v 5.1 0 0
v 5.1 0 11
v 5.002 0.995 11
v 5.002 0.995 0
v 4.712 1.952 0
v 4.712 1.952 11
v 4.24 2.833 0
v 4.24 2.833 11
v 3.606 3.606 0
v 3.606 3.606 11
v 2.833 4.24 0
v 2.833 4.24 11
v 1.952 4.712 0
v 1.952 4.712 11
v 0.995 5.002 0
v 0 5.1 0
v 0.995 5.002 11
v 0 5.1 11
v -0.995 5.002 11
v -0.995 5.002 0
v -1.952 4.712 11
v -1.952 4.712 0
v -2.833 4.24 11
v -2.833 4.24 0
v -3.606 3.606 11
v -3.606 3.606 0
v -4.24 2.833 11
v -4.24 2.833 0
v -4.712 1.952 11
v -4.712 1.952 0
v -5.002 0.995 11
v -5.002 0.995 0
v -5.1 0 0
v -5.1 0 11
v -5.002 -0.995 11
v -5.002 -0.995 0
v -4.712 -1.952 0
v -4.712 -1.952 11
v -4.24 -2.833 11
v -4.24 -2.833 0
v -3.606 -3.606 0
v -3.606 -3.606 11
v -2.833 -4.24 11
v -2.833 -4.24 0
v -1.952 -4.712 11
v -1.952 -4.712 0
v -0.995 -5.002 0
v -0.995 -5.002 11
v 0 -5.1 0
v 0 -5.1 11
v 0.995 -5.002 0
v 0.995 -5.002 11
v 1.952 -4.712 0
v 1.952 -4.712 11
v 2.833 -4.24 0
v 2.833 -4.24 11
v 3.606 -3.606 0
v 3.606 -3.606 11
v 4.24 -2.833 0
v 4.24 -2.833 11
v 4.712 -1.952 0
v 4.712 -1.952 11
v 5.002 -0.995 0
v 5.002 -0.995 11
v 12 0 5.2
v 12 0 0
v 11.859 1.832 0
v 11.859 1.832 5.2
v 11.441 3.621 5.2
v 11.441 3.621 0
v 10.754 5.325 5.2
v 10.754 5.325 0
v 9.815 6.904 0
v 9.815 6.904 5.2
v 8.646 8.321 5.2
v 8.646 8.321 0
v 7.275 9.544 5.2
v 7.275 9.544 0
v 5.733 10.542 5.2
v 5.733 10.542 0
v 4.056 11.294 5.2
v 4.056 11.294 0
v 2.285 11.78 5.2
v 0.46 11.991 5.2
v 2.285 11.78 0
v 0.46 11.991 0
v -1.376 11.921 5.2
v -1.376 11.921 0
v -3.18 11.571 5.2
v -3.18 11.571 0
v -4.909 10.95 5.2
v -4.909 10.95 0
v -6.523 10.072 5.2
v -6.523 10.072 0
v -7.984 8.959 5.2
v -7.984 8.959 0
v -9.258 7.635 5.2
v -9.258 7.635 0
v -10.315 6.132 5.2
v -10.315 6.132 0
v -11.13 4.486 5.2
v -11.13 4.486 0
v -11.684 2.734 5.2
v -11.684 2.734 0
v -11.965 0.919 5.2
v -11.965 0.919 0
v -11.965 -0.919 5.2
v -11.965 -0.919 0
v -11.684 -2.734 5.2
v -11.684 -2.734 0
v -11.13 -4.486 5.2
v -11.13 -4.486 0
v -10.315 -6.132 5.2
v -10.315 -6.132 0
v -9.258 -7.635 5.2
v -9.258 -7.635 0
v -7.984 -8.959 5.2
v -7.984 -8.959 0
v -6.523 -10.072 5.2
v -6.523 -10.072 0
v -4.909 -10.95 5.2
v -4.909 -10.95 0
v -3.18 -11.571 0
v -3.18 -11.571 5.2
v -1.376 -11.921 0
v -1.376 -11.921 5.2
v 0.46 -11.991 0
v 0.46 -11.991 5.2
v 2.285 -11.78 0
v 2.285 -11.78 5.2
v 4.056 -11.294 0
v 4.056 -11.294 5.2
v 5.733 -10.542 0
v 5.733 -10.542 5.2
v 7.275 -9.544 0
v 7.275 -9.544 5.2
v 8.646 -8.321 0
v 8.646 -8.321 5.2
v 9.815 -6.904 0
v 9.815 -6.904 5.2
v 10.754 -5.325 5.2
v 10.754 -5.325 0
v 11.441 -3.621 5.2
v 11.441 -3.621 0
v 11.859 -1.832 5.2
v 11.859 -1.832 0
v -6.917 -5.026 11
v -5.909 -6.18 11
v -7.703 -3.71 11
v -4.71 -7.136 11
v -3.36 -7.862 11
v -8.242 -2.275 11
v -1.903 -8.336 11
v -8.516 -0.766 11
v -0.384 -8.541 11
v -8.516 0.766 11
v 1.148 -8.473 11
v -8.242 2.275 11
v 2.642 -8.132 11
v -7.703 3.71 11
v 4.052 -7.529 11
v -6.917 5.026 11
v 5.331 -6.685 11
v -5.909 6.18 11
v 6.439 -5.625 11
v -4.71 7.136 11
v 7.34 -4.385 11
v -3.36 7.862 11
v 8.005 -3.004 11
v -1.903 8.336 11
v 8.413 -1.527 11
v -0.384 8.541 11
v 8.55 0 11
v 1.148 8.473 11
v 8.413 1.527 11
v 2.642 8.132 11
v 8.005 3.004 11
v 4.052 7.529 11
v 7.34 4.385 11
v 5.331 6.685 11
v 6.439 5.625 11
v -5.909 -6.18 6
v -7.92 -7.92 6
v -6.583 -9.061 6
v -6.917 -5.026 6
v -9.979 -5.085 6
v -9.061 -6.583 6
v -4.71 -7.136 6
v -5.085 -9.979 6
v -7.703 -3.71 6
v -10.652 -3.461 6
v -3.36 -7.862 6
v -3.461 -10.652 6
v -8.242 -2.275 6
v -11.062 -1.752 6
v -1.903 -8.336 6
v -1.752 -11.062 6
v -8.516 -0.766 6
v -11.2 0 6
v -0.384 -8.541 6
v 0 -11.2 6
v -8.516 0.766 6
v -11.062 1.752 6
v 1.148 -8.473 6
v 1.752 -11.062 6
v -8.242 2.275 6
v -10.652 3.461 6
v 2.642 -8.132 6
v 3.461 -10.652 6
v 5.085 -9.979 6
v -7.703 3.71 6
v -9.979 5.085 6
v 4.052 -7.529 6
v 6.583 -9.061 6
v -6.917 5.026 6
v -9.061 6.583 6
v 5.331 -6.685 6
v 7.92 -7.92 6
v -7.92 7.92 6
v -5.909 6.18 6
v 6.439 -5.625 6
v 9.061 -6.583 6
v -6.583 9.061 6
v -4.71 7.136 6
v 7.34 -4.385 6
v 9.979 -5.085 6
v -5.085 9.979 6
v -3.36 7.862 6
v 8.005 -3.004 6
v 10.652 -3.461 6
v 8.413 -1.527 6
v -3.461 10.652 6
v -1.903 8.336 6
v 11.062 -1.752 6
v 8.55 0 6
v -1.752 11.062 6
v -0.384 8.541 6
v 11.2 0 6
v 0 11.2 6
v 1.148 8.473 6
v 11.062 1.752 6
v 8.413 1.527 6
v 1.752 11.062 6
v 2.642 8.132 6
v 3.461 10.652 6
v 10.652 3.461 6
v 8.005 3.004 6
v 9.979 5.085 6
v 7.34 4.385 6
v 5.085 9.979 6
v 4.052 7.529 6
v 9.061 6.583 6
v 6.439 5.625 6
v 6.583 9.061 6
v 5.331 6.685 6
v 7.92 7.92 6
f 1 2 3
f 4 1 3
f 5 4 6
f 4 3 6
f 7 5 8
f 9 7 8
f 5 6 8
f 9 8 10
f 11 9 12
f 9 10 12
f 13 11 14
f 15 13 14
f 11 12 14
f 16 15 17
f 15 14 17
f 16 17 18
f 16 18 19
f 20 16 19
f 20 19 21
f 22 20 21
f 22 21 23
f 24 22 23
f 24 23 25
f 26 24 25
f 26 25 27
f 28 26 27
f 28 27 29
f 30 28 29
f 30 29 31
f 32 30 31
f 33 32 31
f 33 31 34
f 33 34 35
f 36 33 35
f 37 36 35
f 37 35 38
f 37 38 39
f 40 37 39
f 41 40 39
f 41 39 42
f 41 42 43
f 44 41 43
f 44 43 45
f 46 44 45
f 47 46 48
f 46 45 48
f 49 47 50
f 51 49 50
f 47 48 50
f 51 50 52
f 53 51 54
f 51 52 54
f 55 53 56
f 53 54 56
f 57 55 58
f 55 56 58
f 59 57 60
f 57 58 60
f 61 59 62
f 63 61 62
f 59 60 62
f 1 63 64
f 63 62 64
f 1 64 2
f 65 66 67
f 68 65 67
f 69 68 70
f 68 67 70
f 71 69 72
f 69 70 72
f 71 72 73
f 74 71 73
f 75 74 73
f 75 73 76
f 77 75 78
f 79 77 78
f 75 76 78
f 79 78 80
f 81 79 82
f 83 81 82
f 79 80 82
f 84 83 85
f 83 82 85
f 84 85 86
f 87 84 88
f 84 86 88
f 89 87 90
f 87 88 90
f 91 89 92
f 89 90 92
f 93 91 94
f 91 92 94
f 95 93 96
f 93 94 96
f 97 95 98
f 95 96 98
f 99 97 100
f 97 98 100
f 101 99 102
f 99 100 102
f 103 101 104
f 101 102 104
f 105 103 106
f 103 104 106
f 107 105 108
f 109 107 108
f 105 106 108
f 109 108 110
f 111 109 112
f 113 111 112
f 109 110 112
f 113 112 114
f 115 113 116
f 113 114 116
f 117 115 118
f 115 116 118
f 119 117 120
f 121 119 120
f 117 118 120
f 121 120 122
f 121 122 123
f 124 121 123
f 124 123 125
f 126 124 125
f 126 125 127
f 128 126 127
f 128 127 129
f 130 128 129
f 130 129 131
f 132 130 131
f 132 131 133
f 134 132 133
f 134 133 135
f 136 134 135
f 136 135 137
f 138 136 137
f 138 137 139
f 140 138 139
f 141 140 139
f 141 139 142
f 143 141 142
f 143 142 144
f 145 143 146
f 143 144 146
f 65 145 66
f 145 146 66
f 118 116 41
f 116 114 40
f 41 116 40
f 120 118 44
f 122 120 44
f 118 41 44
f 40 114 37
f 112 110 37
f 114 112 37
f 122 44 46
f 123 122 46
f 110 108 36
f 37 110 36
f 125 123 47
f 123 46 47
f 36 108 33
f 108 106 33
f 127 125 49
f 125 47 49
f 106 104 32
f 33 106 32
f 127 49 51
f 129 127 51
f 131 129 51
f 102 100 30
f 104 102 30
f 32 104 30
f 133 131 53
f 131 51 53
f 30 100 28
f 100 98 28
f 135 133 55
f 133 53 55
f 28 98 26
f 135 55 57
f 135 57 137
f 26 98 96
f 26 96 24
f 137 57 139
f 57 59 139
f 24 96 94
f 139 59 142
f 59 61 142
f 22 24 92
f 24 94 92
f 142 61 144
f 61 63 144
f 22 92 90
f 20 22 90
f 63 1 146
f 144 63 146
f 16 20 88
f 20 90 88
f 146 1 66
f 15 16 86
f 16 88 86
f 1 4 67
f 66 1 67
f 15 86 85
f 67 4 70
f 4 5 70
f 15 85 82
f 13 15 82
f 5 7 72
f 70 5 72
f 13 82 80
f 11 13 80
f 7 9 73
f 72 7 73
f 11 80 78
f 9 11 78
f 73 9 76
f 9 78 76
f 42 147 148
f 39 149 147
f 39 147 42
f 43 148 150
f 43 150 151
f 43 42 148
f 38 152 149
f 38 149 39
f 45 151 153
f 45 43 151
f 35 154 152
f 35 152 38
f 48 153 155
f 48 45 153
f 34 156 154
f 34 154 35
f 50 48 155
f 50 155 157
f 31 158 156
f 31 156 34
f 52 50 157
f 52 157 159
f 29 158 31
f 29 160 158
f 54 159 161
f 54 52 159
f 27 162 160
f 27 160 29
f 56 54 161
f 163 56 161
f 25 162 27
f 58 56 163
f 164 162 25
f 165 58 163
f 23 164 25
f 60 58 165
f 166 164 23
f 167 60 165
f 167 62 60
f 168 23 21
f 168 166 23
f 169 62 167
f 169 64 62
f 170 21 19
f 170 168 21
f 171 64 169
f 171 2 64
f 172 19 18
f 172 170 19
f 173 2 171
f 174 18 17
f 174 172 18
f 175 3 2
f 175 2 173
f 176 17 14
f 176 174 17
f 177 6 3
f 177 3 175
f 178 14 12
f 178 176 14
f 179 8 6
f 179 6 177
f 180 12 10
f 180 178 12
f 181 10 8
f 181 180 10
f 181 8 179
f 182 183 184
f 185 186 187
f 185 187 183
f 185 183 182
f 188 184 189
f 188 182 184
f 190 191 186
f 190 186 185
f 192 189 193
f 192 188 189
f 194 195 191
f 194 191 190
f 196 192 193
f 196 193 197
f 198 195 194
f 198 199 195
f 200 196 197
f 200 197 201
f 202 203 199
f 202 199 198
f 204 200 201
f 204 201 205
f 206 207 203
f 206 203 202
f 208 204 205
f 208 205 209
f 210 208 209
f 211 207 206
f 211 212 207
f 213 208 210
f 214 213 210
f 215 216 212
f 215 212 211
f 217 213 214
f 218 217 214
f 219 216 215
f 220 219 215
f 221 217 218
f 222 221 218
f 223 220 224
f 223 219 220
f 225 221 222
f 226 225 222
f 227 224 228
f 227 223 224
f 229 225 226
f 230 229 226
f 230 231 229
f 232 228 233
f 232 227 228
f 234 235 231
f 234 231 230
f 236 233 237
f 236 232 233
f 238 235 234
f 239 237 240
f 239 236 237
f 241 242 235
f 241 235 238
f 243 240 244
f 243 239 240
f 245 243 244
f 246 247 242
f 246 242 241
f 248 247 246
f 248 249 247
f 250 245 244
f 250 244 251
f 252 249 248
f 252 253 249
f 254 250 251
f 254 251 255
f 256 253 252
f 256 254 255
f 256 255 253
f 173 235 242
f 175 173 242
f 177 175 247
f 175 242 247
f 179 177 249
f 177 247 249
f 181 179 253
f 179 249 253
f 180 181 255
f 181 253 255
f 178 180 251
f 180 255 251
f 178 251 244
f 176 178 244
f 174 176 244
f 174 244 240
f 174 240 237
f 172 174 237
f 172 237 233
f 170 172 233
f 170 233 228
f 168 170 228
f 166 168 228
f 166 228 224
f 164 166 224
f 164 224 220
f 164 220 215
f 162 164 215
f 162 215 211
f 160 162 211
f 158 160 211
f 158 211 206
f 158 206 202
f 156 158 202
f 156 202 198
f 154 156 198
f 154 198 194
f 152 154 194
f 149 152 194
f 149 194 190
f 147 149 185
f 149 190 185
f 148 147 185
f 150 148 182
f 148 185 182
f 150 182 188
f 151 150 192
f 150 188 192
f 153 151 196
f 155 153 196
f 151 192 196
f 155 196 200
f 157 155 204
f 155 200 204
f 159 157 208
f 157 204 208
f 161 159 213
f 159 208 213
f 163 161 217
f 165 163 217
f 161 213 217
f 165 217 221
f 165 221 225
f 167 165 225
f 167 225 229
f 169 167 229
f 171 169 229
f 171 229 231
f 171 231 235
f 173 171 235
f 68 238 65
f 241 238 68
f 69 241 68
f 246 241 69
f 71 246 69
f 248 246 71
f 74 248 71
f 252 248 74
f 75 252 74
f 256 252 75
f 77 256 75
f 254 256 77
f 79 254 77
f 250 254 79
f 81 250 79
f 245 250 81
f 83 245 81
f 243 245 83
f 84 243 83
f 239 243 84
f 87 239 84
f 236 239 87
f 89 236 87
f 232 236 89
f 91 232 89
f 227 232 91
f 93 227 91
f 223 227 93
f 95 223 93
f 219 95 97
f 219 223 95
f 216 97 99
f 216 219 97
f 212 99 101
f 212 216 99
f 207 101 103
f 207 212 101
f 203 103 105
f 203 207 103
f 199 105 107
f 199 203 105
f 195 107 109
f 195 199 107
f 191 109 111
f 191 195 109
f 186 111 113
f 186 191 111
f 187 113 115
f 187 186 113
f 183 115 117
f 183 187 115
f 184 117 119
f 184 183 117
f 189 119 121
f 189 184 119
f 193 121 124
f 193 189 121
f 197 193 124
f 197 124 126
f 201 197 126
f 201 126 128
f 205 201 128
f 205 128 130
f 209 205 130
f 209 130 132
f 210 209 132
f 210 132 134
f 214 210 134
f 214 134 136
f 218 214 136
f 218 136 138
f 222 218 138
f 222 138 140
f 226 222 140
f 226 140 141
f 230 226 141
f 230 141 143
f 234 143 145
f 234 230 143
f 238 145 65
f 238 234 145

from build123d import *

# Parameters (mm, degrees)
F0_R     = 8.55
F1_DEPTH = 11
F0_R_2   = 12
F2_DEPTH = 6
F3_R     = 5.1
F4_DEPTH = 25
F5_SIZE  = 0.8


with BuildPart() as f1:
    # F0 (on Top) → F1 (new body)
    with BuildSketch(Plane.XY):
        Circle(F0_R)
    extrude(amount=F1_DEPTH)

    # F0 (on Top) → F2 (join)
    with BuildSketch(Plane.XY):
        Circle(F0_R_2)
        Circle(F0_R, mode=Mode.SUBTRACT)
    extrude(amount=F2_DEPTH)

    # F3 (on face) → F4 (cut)
    with BuildSketch(Plane.XY.offset(11)):
        Circle(F3_R)
    extrude(amount=-F4_DEPTH, mode=Mode.SUBTRACT)

    # F5
    f5_edges = [f1.edges().sort_by_distance(p)[0] for p in [
        (-12, 0, 6),
    ]]
    chamfer(f5_edges, length=F5_SIZE)


solid = f1.part
